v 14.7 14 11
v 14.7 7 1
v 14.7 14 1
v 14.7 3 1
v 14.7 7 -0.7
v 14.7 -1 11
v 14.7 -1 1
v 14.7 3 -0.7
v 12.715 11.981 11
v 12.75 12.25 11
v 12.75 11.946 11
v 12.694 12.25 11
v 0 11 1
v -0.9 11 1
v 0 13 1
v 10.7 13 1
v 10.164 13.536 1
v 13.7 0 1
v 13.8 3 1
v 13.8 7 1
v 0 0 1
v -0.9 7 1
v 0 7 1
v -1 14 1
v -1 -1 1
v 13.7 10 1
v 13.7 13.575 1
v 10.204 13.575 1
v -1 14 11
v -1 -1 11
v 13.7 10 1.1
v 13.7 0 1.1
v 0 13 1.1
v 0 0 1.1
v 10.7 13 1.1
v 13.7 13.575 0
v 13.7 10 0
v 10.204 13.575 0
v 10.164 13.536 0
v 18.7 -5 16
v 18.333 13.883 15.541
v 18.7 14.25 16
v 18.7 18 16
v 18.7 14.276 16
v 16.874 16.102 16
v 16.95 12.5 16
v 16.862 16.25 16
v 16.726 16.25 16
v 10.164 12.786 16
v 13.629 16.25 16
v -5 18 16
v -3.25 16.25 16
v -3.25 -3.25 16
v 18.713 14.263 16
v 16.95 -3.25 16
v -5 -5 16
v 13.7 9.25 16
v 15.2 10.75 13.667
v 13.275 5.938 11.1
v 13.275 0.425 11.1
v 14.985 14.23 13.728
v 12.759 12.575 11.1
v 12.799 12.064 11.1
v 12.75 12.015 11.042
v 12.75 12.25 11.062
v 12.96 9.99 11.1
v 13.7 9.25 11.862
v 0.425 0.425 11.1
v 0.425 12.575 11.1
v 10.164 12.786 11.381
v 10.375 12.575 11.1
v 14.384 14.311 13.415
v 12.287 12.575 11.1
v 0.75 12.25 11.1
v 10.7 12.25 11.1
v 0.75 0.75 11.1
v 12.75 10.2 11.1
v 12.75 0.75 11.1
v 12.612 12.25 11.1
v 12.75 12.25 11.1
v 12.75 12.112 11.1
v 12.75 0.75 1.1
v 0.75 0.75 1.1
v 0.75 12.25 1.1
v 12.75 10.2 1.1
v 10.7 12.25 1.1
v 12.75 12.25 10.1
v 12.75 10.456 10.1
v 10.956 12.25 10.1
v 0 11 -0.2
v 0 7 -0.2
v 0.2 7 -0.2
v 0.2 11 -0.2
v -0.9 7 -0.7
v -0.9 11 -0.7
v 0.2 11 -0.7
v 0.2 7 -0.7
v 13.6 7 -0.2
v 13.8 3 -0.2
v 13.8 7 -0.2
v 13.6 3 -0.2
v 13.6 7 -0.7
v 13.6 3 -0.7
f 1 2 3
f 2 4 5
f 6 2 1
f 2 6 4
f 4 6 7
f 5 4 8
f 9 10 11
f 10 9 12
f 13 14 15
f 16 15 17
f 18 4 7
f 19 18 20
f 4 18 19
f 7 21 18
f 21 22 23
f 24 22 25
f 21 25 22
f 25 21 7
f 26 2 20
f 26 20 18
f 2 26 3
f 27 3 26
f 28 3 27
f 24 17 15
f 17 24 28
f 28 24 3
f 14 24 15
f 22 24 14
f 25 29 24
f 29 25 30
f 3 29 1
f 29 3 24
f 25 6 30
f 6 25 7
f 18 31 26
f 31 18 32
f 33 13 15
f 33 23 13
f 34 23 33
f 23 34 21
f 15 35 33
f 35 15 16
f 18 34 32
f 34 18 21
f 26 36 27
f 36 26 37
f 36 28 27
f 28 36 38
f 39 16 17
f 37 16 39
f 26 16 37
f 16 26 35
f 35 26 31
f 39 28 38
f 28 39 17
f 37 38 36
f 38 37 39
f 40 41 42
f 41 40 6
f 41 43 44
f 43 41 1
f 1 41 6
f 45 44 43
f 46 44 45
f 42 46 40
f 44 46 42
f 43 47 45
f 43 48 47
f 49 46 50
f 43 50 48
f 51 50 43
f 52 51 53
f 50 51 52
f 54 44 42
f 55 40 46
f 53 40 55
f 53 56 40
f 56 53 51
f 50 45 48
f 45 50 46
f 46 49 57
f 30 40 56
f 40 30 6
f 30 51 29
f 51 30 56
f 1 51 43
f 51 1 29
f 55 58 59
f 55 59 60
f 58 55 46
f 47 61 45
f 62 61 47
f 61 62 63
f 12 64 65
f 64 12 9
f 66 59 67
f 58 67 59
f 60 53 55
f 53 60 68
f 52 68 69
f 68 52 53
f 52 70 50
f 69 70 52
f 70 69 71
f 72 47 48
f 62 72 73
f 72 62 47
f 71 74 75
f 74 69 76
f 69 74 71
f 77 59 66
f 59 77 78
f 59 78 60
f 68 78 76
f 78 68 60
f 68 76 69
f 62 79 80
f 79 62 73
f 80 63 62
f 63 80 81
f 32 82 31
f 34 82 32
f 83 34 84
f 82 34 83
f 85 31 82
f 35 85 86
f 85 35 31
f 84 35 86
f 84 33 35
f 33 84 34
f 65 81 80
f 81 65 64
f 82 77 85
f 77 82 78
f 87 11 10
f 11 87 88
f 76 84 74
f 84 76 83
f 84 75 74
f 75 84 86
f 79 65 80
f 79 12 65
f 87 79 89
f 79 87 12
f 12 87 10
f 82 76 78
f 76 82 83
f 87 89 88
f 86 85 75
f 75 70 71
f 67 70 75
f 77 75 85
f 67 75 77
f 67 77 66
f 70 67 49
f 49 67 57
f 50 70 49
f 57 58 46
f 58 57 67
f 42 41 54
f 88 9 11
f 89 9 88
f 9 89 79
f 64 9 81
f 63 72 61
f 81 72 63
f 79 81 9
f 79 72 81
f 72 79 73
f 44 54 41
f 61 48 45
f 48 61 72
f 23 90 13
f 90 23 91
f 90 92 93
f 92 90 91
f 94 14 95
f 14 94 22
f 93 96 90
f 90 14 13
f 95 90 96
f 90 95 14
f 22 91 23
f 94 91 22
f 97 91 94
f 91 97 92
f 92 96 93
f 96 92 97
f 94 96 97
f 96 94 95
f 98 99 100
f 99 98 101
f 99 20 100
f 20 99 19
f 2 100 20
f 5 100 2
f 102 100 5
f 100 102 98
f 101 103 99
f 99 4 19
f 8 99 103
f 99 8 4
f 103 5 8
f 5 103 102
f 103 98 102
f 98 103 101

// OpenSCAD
$fn = 100;

translate([0,0,1]){
difference(){

translate([-1,-1,0]){
cube([13.7+2,13+2,10]);
}
translate([0,0,-5]){
cube([13.7, 13, 40]);
}


}

translate([13.7,10,-1]){
difference(){
rotate([0,0,45]){
cube([5,5,10]);
}
translate([0,0,-2]){
cube([10,10,15]);
translate([-5,3.575,0]){
cube([10,10,15]);
}
}
}
}
}

translate([-0.9,7,-0.2]){
cube([0.9,4,1.2]);
}
translate([-0.9,7,-0.7]){
cube([1.1,4,0.5]);
}

translate([13.8,3,-0.2]){
cube([0.9,4,1.2]);
}
translate([13.6,3,-0.7]){
cube([1.1,4,0.5]);
}

//color("green"){
//headpost();
//}

module headpost(){
difference(){
cube([13.6,13.3,1]);
translate([13.6/2,13.3/2,-2]){
cylinder(d=9.65,h=6);
}
translate([13.6,9.4,-5]){
rotate([0,0,45]){
cube([5.5,5.5,10]);
}
}
}

translate([-9.8,0,0]){
cube([9.8,3.5,1]);
}

translate([10,2,0]){
rotate([0,0,-38]){
cube([17.9,2.3,1]);
}
}
}

CubePoints = [
  [  -1,  -1,  0 ],  //0
  [ 14.7,  -1,  0 ],  //1
  [ 14.7,  14,  0 ],  //2
  [  -1,  14,  0 ],  //3
  [  -5,  -5,  5 ],  //4
  [ 13.7+5,  -5,  5 ],  //5
  [ 13.7+5,  13+5,  5 ],  //6
  [  -5,  13+5,  5 ]]; //7
CubeFaces = [
  [0,1,2,3],  // bottom
  [4,5,1,0],  // front
  [7,6,5,4],  // top
  [5,6,2,1],  // right
  [6,7,3,2],  // back
  [7,4,0,3]]; // left
  
  
CubePoints2 = [
  [  2.0,  2,  0 ],  //0
  [ 11.7,  2,  0 ],  //1
  [ 11,  11,  0 ],  //2
  [  2,  11,  0 ],  //3
  [  -4,  -4,  8 ],  //4
  [ 12.7+5,  -4,  8 ],  //5
  [ 12.7+5,  12+5,  8 ],  //6
  [  -4,  12+5,  8 ]]; //7
CubeFaces2 = [
  [0,1,2,3],  // bottom
  [4,5,1,0],  // front
  [7,6,5,4],  // top
  [5,6,2,1],  // right
  [6,7,3,2],  // back
  [7,4,0,3]]; // left


 difference(){
 
color("limegreen"){ 
translate([0,0,11]){
polyhedron( CubePoints, CubeFaces );
}
}

color("magenta"){
translate([0,0,9]){
polyhedron( CubePoints2, CubeFaces2);
}
}
}

translate([0,0,1.1]){
difference(){
cube([13.7,13,10]);
translate([0.75,0.75,-2]){
cube([12,11.5,14]);
}
}
}

translate([13.7,9.25,1.1]){
difference(){
rotate([0,0,45]){
cube([5,5,9]);
}
translate([0,0,-2]){
cube([10,10,15]);
translate([-5,3.575,0]){
cube([10,10,15]);
}
}
}
}

translate([13.7,9.25,6]){
difference(){
rotate([0,0,45]){
cube([10,5,10]);
}

rotate([0,49.5,45]){
translate([-3,-4,0]){
cube([10,15,15]);
}
}
}
}
